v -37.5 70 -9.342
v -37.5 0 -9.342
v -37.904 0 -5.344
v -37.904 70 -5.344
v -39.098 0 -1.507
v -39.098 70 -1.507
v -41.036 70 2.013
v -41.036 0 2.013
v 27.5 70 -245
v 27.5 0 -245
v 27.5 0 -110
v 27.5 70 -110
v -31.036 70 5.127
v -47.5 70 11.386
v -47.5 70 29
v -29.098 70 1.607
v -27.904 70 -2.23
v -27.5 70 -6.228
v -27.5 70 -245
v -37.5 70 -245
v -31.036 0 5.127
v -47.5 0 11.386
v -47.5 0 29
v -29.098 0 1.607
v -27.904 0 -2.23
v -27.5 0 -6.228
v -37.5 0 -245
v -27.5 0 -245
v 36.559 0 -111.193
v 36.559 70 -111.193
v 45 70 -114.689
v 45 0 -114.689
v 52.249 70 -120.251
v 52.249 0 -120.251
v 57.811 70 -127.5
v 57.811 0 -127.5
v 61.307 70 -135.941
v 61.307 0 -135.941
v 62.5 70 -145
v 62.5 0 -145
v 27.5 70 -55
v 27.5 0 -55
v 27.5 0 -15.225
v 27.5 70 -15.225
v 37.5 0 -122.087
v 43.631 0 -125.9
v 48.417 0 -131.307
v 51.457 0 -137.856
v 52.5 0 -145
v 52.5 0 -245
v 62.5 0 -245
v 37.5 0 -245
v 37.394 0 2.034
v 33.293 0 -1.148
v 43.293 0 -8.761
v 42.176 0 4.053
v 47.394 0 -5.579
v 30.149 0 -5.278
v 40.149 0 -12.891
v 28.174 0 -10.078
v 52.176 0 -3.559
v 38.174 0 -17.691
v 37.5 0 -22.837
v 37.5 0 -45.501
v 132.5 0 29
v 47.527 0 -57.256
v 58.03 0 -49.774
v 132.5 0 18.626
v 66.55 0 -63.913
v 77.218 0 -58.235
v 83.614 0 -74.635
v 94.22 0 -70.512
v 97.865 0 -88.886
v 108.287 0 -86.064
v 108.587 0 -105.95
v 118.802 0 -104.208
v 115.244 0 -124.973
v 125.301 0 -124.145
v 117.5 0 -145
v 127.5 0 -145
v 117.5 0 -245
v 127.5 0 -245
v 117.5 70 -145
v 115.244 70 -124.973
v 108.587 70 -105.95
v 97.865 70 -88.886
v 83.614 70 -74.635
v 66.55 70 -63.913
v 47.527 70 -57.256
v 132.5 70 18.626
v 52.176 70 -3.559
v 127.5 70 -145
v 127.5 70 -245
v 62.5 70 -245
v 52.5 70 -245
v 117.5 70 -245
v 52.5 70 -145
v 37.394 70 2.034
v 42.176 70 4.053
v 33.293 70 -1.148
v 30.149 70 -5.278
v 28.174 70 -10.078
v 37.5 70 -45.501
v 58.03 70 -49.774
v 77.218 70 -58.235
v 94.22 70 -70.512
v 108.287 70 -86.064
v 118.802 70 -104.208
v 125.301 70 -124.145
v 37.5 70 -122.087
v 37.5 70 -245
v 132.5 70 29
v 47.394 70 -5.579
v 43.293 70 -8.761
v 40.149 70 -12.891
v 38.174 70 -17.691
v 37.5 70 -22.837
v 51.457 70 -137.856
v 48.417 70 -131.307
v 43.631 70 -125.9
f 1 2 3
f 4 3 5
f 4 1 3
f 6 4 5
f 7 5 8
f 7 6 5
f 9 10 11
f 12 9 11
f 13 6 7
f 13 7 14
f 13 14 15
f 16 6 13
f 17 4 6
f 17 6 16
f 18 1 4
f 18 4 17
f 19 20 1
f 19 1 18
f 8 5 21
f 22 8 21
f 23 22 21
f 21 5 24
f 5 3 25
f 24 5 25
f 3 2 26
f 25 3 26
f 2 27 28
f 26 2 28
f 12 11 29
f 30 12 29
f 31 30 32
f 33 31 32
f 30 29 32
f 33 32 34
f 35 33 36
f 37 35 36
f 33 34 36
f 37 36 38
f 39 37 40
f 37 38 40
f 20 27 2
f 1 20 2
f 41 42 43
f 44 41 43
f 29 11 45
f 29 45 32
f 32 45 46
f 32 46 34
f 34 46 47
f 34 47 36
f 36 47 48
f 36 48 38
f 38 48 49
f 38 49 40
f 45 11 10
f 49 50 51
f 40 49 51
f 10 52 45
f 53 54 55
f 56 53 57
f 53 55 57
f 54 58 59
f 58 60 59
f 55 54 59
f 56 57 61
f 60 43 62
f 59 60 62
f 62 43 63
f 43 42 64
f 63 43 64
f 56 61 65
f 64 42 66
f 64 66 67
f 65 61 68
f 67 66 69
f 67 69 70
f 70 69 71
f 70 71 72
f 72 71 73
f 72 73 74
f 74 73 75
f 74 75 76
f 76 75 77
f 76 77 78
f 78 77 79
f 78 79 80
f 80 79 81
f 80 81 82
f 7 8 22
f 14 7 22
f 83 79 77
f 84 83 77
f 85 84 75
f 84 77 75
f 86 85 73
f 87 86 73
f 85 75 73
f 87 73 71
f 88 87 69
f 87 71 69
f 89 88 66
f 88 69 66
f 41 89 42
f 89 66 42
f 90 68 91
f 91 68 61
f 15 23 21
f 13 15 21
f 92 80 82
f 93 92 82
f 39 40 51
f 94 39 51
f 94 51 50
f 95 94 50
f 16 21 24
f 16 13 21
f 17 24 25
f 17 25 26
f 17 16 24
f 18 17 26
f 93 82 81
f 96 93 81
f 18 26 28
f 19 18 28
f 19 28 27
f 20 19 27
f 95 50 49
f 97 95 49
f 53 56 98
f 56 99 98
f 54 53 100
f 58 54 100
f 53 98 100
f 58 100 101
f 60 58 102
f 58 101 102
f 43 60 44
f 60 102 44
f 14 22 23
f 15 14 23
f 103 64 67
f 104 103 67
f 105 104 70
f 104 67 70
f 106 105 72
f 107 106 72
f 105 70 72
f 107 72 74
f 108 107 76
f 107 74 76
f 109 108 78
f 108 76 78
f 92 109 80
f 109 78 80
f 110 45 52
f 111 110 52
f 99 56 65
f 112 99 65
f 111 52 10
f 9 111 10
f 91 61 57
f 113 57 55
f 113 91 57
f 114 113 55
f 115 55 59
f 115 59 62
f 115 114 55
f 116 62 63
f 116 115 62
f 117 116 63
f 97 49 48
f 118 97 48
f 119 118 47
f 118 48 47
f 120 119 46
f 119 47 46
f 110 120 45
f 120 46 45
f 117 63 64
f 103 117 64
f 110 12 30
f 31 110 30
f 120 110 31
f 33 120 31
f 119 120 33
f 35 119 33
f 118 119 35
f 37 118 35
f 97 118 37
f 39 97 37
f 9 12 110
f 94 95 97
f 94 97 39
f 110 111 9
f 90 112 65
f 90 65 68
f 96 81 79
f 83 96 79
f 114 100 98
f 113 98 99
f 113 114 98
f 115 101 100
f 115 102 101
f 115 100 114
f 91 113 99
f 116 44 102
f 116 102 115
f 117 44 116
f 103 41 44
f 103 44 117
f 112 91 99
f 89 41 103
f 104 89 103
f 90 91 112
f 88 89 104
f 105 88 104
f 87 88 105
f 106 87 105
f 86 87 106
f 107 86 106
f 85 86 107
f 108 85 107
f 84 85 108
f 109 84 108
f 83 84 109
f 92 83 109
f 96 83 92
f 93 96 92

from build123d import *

# Parameters (mm, degrees)
BOSS_EXTRUDE1_DEPTH   = 70
BOSS_EXTRUDE1_2_DEPTH = 70
BOSS_EXTRUDE1_3_DEPTH = 70
FILLET1_R             = 20
FILLET2_R             = 20


with BuildPart() as part:
    # Sketch1 → Boss-Extrude1 (new body)
    with BuildSketch(Plane(origin=(0, 0, 0), x_dir=(1, 0, 0), z_dir=(0, 1, 0))):
        Polygon((-47.5, -11.386085046), (-47.5, -29), (-27.5, 0), (-27.5, 245), (-37.5, 245), (-37.5, 3.113914954), align=None)
    extrude(amount=BOSS_EXTRUDE1_DEPTH)

    # Fillet2
    fillet2_edges = [part.edges().sort_by_distance(p)[0] for p in [
        (-27.5, 35, 0),
        (-37.5, 35, -3.113914954),
    ]]
    fillet(fillet2_edges, radius=FILLET2_R)


with BuildPart() as body_2:
    # Sketch1 → Boss-Extrude1 2 (new body)
    with BuildSketch(Plane(origin=(0, 0, 0), x_dir=(1, 0, 0), z_dir=(0, 1, 0))):
        with BuildLine():
            Line((27.5, 0), (132.5, -29))
            Line((132.5, -29), (132.5, -18.625602769))
            Line((132.5, -18.625602769), (37.5, 7.612492469))
            Line((37.5, 7.612492469), (37.5, 45.501256289))
            ThreePointArc((37.5, 45.501256289), (101.661984871, 77.917960675), (127.5, 145))
            Line((127.5, 145), (127.5, 245))
            Line((127.5, 245), (117.5, 245))
            Line((117.5, 245), (117.5, 145))
            ThreePointArc((117.5, 145), (91.139610307, 81.360389693), (27.5, 55))
            Line((27.5, 55), (27.5, 0))
        make_face()
    extrude(amount=BOSS_EXTRUDE1_2_DEPTH)

    # Fillet1
    fillet1_edges = [body_2.edges().sort_by_distance(p)[0] for p in [
        (37.5, 35, -7.612492469),
        (27.5, 35, 0),
    ]]
    fillet(fillet1_edges, radius=FILLET1_R)


with BuildPart() as body_3:
    # Sketch1 → Boss-Extrude1 3 (new body)
    with BuildSketch(Plane(origin=(0, 0, 0), x_dir=(1, 0, 0), z_dir=(0, 1, 0))):
        with BuildLine():
            Line((37.5, 245), (27.5, 245))
            Line((27.5, 245), (27.5, 110))
            ThreePointArc((27.5, 110), (52.248737342, 120.251262658), (62.5, 145))
            Line((62.5, 145), (62.5, 245))
            Line((62.5, 245), (52.5, 245))
            Line((52.5, 245), (52.5, 145))
            ThreePointArc((52.5, 145), (48.416500663, 131.306936062), (37.5, 122.087121525))
            Line((37.5, 122.087121525), (37.5, 245))
        make_face()
    extrude(amount=BOSS_EXTRUDE1_3_DEPTH)


solid = Compound([part.part, body_2.part, body_3.part])
